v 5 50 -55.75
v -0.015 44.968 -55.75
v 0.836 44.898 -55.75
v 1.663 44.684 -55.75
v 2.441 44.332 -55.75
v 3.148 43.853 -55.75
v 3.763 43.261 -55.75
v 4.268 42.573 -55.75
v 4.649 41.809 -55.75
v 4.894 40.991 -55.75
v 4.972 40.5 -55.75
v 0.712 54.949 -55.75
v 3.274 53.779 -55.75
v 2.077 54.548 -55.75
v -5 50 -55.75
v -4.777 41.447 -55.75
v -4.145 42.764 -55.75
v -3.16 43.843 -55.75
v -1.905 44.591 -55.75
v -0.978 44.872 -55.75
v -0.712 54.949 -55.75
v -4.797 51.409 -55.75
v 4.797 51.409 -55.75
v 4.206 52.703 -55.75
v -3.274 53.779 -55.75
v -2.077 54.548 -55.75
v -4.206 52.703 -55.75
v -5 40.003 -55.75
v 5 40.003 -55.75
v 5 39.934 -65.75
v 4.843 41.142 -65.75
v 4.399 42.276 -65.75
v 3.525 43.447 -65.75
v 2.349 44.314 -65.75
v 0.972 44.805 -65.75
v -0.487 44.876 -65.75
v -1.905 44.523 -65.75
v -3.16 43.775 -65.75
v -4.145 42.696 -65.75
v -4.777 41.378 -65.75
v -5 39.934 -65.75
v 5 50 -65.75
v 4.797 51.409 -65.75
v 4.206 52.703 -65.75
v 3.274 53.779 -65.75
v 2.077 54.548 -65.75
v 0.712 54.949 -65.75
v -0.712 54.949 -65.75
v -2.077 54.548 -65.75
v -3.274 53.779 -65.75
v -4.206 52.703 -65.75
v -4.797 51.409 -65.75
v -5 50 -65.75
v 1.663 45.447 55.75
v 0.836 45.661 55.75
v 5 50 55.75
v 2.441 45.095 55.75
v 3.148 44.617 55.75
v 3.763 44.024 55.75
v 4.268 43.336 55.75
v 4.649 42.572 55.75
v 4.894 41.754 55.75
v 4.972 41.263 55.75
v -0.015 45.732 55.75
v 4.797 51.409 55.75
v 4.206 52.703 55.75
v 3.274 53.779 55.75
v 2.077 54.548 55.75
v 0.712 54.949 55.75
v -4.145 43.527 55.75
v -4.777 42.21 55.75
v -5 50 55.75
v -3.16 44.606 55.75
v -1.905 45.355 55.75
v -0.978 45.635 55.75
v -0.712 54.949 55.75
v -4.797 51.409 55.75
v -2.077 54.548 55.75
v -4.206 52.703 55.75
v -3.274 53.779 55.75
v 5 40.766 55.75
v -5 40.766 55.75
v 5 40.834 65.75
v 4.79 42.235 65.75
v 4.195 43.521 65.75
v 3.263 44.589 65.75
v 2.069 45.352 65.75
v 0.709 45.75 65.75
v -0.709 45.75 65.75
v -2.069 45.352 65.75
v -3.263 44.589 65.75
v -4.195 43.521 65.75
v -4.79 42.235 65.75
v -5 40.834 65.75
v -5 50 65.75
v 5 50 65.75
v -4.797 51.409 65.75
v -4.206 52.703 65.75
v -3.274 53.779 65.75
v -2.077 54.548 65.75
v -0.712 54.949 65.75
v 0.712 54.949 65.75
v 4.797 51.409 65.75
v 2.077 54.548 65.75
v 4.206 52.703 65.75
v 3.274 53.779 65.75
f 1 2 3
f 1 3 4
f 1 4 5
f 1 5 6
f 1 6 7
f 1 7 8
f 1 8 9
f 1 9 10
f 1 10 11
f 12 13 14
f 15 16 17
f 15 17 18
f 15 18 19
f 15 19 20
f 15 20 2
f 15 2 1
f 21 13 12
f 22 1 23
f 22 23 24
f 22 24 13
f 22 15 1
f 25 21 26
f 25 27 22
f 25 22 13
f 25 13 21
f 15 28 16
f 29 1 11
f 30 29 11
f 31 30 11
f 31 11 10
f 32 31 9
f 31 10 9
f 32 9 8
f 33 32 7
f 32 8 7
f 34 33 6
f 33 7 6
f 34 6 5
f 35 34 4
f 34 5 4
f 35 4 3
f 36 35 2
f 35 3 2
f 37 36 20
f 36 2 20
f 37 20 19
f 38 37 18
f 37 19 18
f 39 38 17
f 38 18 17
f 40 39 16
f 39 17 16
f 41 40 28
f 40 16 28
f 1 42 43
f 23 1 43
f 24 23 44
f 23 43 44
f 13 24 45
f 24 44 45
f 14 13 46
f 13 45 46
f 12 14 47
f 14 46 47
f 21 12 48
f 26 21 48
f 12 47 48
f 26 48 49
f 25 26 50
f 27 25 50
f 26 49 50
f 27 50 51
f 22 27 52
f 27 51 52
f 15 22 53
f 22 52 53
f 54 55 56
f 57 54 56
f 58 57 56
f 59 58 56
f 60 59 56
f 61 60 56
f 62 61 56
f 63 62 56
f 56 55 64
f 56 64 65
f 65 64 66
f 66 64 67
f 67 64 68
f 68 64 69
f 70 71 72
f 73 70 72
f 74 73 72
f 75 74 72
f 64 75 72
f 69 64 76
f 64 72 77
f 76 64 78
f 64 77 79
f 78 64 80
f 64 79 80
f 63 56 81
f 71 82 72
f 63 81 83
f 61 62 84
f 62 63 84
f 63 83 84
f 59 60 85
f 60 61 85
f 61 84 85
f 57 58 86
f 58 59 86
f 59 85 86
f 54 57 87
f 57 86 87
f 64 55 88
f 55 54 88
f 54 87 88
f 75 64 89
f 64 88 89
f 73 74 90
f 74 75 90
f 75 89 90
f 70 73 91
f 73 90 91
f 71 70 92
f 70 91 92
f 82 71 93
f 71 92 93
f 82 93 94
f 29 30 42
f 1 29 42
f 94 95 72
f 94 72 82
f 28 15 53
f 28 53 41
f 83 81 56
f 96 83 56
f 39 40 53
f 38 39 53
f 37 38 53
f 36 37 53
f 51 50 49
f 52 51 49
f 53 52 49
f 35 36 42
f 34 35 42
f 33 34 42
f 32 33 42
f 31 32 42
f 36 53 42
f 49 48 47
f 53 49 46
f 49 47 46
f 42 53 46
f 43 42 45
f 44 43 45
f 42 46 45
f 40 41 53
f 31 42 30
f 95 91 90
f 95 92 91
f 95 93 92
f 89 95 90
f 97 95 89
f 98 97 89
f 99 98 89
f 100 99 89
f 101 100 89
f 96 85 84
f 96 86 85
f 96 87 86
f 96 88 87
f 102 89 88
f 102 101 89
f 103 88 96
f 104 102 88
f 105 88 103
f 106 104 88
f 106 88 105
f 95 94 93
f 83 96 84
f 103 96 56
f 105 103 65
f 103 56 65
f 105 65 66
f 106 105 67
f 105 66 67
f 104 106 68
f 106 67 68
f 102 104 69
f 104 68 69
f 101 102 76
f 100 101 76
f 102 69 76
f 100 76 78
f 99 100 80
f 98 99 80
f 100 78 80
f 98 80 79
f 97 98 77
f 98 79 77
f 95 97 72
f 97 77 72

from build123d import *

# Parameters (mm, degrees)
BOSS_EXTRUDE2_DEPTH      = 65.75
BOSS_EXTRUDE2_DEPTH_BACK = 65.75
CUT_EXTRUDE1_DEPTH       = 143.629623671
CUT_EXTRUDE2_DEPTH       = 86.866539031
CUT_EXTRUDE2_DEPTH_BACK  = 86.866539031
SKETCH6_W                = 111.5
SKETCH6_H                = 20


with BuildPart() as part:
    # Sketch2 → Boss-Extrude2 (new, two sides: drawn at the far end of the back side and taken through both)
    with BuildSketch(Plane.XY.offset(-BOSS_EXTRUDE2_DEPTH_BACK)):
        with BuildLine():
            ThreePointArc((-5, -50), (0, -45), (5, -50))
            Line((5, -50), (5, 50))
            ThreePointArc((5, 50), (0, 55), (-5, 50))
            Line((-5, 50), (-5, -50))
        make_face()
    extrude(amount=BOSS_EXTRUDE2_DEPTH + BOSS_EXTRUDE2_DEPTH_BACK)

    # Sketch5 → Cut-Extrude1 (cut, through all, along a direction that is not the sketch's normal)
    with BuildSketch(Plane.XY.offset(65.75)):
        with BuildLine():
            ThreePointArc((-5, -50), (0, -45), (5, -50))
            Line((5, -50), (5, 40.834103429))
            ThreePointArc((5, 40.834103429), (0, 45.8), (-5, 40.834103429))
            Line((-5, 40.834103429), (-5, -50))
        make_face()
    extrude(amount=-CUT_EXTRUDE1_DEPTH, dir=(0, 0.00684394617439934, 0.999976579926131), mode=Mode.SUBTRACT)

    # Sketch6 → Cut-Extrude2 (cut, two sides: drawn at the far end of the back side and taken through both)
    with BuildSketch(Plane(origin=(0, 0, 0), x_dir=(0, 0, -1), z_dir=(1, 0, 0)).offset(-CUT_EXTRUDE2_DEPTH_BACK)):
        with Locations((0, 45)):
            Rectangle(SKETCH6_W, SKETCH6_H)
    extrude(amount=CUT_EXTRUDE2_DEPTH + CUT_EXTRUDE2_DEPTH_BACK, mode=Mode.SUBTRACT)


with BuildPart() as cut_extrude2_piece_1:
    # of the separate pieces the step leaves, piece 1, a body of its own (cut_extrude2_pieces)
    add(part.part.solids().sort_by_distance((-5, 50, -55.75))[0])


with BuildPart() as cut_extrude2_piece_2:
    # of the separate pieces the step leaves, piece 2, a body of its own (cut_extrude2_pieces)
    add(part.part.solids().sort_by_distance((-5, 50, 65.75))[0])


solid = Compound([cut_extrude2_piece_1.part, cut_extrude2_piece_2.part])
